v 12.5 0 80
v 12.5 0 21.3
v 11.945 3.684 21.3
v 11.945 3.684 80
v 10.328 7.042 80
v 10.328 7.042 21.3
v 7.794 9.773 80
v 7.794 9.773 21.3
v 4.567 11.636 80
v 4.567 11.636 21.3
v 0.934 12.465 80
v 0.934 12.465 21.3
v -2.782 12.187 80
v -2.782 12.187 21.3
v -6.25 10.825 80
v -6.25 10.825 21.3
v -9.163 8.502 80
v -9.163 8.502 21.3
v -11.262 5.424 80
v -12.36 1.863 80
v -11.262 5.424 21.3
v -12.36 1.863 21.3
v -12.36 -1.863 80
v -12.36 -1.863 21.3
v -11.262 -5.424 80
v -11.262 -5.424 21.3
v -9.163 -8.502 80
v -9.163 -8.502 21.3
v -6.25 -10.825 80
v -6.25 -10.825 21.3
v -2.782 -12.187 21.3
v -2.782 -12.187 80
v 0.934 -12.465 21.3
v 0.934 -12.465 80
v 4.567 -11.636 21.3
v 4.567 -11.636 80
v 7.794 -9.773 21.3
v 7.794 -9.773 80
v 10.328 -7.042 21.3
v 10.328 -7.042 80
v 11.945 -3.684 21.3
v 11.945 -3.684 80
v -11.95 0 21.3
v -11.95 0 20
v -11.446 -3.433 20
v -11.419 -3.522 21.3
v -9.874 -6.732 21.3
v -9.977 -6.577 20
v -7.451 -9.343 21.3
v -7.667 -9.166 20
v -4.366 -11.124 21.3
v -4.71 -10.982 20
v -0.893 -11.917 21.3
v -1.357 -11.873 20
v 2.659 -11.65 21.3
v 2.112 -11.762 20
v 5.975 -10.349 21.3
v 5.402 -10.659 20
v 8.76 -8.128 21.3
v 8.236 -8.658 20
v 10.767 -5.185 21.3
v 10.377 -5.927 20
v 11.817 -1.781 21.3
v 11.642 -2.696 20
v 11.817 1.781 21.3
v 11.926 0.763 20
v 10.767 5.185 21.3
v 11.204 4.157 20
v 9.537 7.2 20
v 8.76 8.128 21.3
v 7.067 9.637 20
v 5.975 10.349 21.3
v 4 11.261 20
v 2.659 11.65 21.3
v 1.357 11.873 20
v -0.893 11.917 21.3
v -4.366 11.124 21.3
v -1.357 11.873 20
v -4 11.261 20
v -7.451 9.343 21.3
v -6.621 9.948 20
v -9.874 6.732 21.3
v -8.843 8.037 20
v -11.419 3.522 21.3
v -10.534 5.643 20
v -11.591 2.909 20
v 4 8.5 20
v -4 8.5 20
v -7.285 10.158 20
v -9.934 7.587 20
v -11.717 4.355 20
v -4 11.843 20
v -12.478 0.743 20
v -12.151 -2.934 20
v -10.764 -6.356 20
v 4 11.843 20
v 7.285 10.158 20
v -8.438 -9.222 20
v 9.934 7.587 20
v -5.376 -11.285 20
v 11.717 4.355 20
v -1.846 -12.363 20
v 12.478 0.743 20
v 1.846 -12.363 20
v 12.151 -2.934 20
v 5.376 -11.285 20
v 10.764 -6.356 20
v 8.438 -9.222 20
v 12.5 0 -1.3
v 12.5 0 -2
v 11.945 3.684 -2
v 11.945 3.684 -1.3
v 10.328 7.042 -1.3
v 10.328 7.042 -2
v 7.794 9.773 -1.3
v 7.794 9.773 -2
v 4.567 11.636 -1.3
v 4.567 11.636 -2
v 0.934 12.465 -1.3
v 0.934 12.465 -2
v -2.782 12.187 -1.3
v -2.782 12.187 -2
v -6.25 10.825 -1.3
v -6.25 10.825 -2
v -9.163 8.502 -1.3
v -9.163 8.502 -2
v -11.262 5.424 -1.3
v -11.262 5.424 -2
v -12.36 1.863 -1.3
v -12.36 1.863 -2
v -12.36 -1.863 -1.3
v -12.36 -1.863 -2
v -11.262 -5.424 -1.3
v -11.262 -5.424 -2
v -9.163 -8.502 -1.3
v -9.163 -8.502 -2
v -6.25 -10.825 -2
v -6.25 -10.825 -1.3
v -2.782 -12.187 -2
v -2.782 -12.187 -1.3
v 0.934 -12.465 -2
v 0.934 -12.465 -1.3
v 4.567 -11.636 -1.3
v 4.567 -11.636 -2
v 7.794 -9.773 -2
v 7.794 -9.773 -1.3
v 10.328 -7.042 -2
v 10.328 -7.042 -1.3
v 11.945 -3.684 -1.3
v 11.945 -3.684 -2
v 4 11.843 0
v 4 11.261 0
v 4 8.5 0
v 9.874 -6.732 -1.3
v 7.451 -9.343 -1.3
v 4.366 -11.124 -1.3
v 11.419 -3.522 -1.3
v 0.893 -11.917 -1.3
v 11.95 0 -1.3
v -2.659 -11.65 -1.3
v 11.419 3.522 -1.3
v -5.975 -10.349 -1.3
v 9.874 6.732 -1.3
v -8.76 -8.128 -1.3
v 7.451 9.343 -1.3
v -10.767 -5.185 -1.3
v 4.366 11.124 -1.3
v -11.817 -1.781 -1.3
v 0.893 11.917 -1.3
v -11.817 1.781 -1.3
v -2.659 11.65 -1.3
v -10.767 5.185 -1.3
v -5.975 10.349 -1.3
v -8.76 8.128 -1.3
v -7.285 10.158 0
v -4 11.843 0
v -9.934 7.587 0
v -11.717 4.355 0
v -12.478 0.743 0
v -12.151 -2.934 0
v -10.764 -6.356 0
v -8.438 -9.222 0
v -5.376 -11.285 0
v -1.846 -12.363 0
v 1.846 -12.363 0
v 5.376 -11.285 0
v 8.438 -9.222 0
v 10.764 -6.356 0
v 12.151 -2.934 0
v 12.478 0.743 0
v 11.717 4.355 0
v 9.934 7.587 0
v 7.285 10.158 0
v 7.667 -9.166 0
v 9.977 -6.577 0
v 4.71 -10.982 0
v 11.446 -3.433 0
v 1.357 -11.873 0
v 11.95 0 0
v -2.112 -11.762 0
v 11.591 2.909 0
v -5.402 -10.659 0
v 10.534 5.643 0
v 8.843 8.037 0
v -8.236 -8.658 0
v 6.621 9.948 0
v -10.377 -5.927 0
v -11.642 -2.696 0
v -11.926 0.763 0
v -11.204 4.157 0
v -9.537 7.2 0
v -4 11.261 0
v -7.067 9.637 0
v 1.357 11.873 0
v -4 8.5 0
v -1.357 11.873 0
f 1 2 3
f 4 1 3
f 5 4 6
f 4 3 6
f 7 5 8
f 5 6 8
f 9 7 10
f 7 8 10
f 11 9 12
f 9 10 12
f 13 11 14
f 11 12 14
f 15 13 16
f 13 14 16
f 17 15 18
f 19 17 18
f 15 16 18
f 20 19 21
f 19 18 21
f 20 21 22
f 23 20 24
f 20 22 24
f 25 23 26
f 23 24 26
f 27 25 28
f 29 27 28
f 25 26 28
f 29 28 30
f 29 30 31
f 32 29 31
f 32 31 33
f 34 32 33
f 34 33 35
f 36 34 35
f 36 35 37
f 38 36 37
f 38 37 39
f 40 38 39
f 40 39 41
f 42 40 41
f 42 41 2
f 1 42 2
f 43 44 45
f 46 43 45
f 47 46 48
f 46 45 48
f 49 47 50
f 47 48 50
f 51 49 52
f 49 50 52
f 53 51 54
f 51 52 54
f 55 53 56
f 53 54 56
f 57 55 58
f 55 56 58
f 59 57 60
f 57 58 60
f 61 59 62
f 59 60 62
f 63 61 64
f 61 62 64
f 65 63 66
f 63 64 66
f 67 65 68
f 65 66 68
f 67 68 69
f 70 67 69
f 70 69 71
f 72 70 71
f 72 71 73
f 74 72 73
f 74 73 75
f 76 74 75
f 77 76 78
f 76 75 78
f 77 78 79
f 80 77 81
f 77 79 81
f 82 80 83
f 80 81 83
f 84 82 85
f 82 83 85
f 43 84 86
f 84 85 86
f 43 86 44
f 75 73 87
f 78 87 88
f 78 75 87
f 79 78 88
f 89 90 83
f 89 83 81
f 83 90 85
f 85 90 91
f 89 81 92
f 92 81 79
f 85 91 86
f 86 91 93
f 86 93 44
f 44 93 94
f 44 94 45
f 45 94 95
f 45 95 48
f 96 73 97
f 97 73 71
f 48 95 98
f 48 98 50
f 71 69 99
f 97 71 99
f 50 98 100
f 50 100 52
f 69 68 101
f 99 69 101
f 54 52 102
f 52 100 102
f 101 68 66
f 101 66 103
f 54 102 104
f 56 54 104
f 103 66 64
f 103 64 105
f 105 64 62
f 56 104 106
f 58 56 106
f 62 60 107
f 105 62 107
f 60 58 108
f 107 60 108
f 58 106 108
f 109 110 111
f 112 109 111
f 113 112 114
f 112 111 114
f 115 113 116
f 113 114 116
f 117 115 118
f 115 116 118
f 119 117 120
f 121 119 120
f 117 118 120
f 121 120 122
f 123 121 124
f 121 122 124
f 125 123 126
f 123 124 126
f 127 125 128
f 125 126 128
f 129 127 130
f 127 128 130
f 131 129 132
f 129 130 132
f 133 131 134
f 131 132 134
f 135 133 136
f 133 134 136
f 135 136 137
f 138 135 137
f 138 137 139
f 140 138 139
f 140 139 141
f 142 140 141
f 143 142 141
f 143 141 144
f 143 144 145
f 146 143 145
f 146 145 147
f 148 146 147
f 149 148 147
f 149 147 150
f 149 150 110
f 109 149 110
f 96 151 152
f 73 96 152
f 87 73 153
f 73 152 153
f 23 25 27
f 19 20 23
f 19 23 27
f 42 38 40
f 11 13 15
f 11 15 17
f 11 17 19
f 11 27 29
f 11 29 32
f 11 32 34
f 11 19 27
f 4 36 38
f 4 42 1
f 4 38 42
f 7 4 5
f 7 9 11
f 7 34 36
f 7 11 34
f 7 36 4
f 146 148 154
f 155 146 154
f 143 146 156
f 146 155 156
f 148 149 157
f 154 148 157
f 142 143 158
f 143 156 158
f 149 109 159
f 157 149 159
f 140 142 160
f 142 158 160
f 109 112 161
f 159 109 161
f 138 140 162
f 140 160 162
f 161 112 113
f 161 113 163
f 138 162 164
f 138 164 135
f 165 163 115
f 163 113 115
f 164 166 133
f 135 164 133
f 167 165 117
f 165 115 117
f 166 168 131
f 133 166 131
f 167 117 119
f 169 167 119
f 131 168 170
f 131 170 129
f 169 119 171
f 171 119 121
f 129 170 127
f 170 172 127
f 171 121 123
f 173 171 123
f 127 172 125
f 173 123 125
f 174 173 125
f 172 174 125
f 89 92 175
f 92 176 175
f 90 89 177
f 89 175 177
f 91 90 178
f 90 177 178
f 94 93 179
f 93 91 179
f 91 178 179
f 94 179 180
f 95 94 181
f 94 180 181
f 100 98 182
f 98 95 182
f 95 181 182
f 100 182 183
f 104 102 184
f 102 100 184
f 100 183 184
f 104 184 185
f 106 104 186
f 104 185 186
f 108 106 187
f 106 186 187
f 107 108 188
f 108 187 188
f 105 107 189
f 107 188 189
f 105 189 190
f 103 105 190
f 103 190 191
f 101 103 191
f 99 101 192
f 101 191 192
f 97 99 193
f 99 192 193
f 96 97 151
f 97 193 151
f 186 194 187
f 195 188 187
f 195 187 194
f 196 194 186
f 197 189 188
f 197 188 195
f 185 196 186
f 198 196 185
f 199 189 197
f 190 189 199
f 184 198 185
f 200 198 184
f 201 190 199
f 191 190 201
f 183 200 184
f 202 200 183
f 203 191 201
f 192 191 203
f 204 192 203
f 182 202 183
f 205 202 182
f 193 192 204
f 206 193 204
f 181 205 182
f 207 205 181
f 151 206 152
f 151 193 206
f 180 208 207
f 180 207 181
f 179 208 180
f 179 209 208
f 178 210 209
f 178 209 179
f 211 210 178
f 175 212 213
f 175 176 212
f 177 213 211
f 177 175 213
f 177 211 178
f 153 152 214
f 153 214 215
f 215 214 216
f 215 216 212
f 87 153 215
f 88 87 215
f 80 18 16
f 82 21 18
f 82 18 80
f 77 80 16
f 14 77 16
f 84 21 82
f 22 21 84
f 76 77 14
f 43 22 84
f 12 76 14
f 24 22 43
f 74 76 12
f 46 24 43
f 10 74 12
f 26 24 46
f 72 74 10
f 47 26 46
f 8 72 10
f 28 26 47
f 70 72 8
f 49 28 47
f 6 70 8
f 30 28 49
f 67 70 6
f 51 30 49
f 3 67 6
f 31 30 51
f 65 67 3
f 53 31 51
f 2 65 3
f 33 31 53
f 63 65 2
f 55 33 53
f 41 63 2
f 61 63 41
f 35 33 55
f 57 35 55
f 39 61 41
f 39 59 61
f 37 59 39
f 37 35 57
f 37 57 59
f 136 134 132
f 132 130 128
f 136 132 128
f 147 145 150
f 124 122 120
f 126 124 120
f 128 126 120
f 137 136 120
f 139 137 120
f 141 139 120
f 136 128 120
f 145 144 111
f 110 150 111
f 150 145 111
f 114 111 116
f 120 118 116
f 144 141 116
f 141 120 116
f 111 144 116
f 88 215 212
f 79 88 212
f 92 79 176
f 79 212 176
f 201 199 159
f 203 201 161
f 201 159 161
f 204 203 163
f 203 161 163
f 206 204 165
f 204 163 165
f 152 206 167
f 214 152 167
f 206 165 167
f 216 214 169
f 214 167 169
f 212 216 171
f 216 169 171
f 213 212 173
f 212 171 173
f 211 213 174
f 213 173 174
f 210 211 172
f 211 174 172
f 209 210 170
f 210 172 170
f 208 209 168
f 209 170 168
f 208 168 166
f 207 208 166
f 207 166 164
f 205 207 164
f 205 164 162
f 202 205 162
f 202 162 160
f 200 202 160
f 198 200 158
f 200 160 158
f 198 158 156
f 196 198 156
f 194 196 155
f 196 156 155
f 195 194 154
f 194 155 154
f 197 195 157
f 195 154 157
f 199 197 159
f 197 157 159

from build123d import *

# Parameters (mm, degrees)
BOSS_EXTRUDE1_DEPTH      = 80
BOSS_EXTRUDE1_DEPTH_BACK = 2
SKETCH1_R                = 12.5
CUT_EXTRUDE1_START       = -2
CUT_EXTRUDE1_DEPTH       = 20
SKETCH4_W                = 1.3
SKETCH4_H                = 0.55
SKETCH5_W                = 1.3
SKETCH5_H                = 0.55


with BuildPart() as part:
    # Sketch1 → Boss-Extrude1 (new, two sides: drawn at the far end of the back side and taken through both)
    with BuildSketch(Plane.XY.offset(-BOSS_EXTRUDE1_DEPTH_BACK)):
        Circle(SKETCH1_R)
    extrude(amount=BOSS_EXTRUDE1_DEPTH + BOSS_EXTRUDE1_DEPTH_BACK)

    # Sketch2 → Cut-Extrude1 (cut)
    with BuildSketch(Plane(origin=(0, 0, -2), x_dir=(-1, 0, 0), z_dir=(0, 0, -1)).offset(CUT_EXTRUDE1_START)):
        with BuildLine():
            Line((-4, 11.842719282), (-4, 8.5))
            Line((-4, 8.5), (4, 8.5))
            Line((4, 8.5), (4, 11.842719282))
            ThreePointArc((4, 11.842719282), (0, 12.5), (-4, 11.842719282))
        make_face()
    extrude(amount=-CUT_EXTRUDE1_DEPTH, mode=Mode.SUBTRACT)

    # Sketch4 → Cut-Revolve1 (revolve, cut)
    with BuildSketch(Plane(origin=(0, 0, 0), x_dir=(0, 0, -1), z_dir=(1, 0, 0)), mode=Mode.PRIVATE) as cut_revolve1_sk:
        with Locations((0.65, 12.225)):
            Rectangle(SKETCH4_W, SKETCH4_H)
    revolve(cut_revolve1_sk.sketch.rotate(Axis((0, 0, -5.566261423), (0, 0, 1)), 270), axis=Axis((0, 0, -5.566261423), (0, 0, 1)), mode=Mode.SUBTRACT)

    # Sketch5 → Cut-Revolve2 (revolve, cut)
    with BuildSketch(Plane(origin=(0, 0, 0), x_dir=(0, 0, -1), z_dir=(1, 0, 0)), mode=Mode.PRIVATE) as cut_revolve2_sk:
        with Locations((-20.65, 12.225)):
            Rectangle(SKETCH5_W, SKETCH5_H)
    revolve(cut_revolve2_sk.sketch.rotate(Axis((0, 0, 0), (0, 0, 1)), 90), axis=Axis((0, 0, 0), (0, 0, 1)), mode=Mode.SUBTRACT)


solid = part.part
